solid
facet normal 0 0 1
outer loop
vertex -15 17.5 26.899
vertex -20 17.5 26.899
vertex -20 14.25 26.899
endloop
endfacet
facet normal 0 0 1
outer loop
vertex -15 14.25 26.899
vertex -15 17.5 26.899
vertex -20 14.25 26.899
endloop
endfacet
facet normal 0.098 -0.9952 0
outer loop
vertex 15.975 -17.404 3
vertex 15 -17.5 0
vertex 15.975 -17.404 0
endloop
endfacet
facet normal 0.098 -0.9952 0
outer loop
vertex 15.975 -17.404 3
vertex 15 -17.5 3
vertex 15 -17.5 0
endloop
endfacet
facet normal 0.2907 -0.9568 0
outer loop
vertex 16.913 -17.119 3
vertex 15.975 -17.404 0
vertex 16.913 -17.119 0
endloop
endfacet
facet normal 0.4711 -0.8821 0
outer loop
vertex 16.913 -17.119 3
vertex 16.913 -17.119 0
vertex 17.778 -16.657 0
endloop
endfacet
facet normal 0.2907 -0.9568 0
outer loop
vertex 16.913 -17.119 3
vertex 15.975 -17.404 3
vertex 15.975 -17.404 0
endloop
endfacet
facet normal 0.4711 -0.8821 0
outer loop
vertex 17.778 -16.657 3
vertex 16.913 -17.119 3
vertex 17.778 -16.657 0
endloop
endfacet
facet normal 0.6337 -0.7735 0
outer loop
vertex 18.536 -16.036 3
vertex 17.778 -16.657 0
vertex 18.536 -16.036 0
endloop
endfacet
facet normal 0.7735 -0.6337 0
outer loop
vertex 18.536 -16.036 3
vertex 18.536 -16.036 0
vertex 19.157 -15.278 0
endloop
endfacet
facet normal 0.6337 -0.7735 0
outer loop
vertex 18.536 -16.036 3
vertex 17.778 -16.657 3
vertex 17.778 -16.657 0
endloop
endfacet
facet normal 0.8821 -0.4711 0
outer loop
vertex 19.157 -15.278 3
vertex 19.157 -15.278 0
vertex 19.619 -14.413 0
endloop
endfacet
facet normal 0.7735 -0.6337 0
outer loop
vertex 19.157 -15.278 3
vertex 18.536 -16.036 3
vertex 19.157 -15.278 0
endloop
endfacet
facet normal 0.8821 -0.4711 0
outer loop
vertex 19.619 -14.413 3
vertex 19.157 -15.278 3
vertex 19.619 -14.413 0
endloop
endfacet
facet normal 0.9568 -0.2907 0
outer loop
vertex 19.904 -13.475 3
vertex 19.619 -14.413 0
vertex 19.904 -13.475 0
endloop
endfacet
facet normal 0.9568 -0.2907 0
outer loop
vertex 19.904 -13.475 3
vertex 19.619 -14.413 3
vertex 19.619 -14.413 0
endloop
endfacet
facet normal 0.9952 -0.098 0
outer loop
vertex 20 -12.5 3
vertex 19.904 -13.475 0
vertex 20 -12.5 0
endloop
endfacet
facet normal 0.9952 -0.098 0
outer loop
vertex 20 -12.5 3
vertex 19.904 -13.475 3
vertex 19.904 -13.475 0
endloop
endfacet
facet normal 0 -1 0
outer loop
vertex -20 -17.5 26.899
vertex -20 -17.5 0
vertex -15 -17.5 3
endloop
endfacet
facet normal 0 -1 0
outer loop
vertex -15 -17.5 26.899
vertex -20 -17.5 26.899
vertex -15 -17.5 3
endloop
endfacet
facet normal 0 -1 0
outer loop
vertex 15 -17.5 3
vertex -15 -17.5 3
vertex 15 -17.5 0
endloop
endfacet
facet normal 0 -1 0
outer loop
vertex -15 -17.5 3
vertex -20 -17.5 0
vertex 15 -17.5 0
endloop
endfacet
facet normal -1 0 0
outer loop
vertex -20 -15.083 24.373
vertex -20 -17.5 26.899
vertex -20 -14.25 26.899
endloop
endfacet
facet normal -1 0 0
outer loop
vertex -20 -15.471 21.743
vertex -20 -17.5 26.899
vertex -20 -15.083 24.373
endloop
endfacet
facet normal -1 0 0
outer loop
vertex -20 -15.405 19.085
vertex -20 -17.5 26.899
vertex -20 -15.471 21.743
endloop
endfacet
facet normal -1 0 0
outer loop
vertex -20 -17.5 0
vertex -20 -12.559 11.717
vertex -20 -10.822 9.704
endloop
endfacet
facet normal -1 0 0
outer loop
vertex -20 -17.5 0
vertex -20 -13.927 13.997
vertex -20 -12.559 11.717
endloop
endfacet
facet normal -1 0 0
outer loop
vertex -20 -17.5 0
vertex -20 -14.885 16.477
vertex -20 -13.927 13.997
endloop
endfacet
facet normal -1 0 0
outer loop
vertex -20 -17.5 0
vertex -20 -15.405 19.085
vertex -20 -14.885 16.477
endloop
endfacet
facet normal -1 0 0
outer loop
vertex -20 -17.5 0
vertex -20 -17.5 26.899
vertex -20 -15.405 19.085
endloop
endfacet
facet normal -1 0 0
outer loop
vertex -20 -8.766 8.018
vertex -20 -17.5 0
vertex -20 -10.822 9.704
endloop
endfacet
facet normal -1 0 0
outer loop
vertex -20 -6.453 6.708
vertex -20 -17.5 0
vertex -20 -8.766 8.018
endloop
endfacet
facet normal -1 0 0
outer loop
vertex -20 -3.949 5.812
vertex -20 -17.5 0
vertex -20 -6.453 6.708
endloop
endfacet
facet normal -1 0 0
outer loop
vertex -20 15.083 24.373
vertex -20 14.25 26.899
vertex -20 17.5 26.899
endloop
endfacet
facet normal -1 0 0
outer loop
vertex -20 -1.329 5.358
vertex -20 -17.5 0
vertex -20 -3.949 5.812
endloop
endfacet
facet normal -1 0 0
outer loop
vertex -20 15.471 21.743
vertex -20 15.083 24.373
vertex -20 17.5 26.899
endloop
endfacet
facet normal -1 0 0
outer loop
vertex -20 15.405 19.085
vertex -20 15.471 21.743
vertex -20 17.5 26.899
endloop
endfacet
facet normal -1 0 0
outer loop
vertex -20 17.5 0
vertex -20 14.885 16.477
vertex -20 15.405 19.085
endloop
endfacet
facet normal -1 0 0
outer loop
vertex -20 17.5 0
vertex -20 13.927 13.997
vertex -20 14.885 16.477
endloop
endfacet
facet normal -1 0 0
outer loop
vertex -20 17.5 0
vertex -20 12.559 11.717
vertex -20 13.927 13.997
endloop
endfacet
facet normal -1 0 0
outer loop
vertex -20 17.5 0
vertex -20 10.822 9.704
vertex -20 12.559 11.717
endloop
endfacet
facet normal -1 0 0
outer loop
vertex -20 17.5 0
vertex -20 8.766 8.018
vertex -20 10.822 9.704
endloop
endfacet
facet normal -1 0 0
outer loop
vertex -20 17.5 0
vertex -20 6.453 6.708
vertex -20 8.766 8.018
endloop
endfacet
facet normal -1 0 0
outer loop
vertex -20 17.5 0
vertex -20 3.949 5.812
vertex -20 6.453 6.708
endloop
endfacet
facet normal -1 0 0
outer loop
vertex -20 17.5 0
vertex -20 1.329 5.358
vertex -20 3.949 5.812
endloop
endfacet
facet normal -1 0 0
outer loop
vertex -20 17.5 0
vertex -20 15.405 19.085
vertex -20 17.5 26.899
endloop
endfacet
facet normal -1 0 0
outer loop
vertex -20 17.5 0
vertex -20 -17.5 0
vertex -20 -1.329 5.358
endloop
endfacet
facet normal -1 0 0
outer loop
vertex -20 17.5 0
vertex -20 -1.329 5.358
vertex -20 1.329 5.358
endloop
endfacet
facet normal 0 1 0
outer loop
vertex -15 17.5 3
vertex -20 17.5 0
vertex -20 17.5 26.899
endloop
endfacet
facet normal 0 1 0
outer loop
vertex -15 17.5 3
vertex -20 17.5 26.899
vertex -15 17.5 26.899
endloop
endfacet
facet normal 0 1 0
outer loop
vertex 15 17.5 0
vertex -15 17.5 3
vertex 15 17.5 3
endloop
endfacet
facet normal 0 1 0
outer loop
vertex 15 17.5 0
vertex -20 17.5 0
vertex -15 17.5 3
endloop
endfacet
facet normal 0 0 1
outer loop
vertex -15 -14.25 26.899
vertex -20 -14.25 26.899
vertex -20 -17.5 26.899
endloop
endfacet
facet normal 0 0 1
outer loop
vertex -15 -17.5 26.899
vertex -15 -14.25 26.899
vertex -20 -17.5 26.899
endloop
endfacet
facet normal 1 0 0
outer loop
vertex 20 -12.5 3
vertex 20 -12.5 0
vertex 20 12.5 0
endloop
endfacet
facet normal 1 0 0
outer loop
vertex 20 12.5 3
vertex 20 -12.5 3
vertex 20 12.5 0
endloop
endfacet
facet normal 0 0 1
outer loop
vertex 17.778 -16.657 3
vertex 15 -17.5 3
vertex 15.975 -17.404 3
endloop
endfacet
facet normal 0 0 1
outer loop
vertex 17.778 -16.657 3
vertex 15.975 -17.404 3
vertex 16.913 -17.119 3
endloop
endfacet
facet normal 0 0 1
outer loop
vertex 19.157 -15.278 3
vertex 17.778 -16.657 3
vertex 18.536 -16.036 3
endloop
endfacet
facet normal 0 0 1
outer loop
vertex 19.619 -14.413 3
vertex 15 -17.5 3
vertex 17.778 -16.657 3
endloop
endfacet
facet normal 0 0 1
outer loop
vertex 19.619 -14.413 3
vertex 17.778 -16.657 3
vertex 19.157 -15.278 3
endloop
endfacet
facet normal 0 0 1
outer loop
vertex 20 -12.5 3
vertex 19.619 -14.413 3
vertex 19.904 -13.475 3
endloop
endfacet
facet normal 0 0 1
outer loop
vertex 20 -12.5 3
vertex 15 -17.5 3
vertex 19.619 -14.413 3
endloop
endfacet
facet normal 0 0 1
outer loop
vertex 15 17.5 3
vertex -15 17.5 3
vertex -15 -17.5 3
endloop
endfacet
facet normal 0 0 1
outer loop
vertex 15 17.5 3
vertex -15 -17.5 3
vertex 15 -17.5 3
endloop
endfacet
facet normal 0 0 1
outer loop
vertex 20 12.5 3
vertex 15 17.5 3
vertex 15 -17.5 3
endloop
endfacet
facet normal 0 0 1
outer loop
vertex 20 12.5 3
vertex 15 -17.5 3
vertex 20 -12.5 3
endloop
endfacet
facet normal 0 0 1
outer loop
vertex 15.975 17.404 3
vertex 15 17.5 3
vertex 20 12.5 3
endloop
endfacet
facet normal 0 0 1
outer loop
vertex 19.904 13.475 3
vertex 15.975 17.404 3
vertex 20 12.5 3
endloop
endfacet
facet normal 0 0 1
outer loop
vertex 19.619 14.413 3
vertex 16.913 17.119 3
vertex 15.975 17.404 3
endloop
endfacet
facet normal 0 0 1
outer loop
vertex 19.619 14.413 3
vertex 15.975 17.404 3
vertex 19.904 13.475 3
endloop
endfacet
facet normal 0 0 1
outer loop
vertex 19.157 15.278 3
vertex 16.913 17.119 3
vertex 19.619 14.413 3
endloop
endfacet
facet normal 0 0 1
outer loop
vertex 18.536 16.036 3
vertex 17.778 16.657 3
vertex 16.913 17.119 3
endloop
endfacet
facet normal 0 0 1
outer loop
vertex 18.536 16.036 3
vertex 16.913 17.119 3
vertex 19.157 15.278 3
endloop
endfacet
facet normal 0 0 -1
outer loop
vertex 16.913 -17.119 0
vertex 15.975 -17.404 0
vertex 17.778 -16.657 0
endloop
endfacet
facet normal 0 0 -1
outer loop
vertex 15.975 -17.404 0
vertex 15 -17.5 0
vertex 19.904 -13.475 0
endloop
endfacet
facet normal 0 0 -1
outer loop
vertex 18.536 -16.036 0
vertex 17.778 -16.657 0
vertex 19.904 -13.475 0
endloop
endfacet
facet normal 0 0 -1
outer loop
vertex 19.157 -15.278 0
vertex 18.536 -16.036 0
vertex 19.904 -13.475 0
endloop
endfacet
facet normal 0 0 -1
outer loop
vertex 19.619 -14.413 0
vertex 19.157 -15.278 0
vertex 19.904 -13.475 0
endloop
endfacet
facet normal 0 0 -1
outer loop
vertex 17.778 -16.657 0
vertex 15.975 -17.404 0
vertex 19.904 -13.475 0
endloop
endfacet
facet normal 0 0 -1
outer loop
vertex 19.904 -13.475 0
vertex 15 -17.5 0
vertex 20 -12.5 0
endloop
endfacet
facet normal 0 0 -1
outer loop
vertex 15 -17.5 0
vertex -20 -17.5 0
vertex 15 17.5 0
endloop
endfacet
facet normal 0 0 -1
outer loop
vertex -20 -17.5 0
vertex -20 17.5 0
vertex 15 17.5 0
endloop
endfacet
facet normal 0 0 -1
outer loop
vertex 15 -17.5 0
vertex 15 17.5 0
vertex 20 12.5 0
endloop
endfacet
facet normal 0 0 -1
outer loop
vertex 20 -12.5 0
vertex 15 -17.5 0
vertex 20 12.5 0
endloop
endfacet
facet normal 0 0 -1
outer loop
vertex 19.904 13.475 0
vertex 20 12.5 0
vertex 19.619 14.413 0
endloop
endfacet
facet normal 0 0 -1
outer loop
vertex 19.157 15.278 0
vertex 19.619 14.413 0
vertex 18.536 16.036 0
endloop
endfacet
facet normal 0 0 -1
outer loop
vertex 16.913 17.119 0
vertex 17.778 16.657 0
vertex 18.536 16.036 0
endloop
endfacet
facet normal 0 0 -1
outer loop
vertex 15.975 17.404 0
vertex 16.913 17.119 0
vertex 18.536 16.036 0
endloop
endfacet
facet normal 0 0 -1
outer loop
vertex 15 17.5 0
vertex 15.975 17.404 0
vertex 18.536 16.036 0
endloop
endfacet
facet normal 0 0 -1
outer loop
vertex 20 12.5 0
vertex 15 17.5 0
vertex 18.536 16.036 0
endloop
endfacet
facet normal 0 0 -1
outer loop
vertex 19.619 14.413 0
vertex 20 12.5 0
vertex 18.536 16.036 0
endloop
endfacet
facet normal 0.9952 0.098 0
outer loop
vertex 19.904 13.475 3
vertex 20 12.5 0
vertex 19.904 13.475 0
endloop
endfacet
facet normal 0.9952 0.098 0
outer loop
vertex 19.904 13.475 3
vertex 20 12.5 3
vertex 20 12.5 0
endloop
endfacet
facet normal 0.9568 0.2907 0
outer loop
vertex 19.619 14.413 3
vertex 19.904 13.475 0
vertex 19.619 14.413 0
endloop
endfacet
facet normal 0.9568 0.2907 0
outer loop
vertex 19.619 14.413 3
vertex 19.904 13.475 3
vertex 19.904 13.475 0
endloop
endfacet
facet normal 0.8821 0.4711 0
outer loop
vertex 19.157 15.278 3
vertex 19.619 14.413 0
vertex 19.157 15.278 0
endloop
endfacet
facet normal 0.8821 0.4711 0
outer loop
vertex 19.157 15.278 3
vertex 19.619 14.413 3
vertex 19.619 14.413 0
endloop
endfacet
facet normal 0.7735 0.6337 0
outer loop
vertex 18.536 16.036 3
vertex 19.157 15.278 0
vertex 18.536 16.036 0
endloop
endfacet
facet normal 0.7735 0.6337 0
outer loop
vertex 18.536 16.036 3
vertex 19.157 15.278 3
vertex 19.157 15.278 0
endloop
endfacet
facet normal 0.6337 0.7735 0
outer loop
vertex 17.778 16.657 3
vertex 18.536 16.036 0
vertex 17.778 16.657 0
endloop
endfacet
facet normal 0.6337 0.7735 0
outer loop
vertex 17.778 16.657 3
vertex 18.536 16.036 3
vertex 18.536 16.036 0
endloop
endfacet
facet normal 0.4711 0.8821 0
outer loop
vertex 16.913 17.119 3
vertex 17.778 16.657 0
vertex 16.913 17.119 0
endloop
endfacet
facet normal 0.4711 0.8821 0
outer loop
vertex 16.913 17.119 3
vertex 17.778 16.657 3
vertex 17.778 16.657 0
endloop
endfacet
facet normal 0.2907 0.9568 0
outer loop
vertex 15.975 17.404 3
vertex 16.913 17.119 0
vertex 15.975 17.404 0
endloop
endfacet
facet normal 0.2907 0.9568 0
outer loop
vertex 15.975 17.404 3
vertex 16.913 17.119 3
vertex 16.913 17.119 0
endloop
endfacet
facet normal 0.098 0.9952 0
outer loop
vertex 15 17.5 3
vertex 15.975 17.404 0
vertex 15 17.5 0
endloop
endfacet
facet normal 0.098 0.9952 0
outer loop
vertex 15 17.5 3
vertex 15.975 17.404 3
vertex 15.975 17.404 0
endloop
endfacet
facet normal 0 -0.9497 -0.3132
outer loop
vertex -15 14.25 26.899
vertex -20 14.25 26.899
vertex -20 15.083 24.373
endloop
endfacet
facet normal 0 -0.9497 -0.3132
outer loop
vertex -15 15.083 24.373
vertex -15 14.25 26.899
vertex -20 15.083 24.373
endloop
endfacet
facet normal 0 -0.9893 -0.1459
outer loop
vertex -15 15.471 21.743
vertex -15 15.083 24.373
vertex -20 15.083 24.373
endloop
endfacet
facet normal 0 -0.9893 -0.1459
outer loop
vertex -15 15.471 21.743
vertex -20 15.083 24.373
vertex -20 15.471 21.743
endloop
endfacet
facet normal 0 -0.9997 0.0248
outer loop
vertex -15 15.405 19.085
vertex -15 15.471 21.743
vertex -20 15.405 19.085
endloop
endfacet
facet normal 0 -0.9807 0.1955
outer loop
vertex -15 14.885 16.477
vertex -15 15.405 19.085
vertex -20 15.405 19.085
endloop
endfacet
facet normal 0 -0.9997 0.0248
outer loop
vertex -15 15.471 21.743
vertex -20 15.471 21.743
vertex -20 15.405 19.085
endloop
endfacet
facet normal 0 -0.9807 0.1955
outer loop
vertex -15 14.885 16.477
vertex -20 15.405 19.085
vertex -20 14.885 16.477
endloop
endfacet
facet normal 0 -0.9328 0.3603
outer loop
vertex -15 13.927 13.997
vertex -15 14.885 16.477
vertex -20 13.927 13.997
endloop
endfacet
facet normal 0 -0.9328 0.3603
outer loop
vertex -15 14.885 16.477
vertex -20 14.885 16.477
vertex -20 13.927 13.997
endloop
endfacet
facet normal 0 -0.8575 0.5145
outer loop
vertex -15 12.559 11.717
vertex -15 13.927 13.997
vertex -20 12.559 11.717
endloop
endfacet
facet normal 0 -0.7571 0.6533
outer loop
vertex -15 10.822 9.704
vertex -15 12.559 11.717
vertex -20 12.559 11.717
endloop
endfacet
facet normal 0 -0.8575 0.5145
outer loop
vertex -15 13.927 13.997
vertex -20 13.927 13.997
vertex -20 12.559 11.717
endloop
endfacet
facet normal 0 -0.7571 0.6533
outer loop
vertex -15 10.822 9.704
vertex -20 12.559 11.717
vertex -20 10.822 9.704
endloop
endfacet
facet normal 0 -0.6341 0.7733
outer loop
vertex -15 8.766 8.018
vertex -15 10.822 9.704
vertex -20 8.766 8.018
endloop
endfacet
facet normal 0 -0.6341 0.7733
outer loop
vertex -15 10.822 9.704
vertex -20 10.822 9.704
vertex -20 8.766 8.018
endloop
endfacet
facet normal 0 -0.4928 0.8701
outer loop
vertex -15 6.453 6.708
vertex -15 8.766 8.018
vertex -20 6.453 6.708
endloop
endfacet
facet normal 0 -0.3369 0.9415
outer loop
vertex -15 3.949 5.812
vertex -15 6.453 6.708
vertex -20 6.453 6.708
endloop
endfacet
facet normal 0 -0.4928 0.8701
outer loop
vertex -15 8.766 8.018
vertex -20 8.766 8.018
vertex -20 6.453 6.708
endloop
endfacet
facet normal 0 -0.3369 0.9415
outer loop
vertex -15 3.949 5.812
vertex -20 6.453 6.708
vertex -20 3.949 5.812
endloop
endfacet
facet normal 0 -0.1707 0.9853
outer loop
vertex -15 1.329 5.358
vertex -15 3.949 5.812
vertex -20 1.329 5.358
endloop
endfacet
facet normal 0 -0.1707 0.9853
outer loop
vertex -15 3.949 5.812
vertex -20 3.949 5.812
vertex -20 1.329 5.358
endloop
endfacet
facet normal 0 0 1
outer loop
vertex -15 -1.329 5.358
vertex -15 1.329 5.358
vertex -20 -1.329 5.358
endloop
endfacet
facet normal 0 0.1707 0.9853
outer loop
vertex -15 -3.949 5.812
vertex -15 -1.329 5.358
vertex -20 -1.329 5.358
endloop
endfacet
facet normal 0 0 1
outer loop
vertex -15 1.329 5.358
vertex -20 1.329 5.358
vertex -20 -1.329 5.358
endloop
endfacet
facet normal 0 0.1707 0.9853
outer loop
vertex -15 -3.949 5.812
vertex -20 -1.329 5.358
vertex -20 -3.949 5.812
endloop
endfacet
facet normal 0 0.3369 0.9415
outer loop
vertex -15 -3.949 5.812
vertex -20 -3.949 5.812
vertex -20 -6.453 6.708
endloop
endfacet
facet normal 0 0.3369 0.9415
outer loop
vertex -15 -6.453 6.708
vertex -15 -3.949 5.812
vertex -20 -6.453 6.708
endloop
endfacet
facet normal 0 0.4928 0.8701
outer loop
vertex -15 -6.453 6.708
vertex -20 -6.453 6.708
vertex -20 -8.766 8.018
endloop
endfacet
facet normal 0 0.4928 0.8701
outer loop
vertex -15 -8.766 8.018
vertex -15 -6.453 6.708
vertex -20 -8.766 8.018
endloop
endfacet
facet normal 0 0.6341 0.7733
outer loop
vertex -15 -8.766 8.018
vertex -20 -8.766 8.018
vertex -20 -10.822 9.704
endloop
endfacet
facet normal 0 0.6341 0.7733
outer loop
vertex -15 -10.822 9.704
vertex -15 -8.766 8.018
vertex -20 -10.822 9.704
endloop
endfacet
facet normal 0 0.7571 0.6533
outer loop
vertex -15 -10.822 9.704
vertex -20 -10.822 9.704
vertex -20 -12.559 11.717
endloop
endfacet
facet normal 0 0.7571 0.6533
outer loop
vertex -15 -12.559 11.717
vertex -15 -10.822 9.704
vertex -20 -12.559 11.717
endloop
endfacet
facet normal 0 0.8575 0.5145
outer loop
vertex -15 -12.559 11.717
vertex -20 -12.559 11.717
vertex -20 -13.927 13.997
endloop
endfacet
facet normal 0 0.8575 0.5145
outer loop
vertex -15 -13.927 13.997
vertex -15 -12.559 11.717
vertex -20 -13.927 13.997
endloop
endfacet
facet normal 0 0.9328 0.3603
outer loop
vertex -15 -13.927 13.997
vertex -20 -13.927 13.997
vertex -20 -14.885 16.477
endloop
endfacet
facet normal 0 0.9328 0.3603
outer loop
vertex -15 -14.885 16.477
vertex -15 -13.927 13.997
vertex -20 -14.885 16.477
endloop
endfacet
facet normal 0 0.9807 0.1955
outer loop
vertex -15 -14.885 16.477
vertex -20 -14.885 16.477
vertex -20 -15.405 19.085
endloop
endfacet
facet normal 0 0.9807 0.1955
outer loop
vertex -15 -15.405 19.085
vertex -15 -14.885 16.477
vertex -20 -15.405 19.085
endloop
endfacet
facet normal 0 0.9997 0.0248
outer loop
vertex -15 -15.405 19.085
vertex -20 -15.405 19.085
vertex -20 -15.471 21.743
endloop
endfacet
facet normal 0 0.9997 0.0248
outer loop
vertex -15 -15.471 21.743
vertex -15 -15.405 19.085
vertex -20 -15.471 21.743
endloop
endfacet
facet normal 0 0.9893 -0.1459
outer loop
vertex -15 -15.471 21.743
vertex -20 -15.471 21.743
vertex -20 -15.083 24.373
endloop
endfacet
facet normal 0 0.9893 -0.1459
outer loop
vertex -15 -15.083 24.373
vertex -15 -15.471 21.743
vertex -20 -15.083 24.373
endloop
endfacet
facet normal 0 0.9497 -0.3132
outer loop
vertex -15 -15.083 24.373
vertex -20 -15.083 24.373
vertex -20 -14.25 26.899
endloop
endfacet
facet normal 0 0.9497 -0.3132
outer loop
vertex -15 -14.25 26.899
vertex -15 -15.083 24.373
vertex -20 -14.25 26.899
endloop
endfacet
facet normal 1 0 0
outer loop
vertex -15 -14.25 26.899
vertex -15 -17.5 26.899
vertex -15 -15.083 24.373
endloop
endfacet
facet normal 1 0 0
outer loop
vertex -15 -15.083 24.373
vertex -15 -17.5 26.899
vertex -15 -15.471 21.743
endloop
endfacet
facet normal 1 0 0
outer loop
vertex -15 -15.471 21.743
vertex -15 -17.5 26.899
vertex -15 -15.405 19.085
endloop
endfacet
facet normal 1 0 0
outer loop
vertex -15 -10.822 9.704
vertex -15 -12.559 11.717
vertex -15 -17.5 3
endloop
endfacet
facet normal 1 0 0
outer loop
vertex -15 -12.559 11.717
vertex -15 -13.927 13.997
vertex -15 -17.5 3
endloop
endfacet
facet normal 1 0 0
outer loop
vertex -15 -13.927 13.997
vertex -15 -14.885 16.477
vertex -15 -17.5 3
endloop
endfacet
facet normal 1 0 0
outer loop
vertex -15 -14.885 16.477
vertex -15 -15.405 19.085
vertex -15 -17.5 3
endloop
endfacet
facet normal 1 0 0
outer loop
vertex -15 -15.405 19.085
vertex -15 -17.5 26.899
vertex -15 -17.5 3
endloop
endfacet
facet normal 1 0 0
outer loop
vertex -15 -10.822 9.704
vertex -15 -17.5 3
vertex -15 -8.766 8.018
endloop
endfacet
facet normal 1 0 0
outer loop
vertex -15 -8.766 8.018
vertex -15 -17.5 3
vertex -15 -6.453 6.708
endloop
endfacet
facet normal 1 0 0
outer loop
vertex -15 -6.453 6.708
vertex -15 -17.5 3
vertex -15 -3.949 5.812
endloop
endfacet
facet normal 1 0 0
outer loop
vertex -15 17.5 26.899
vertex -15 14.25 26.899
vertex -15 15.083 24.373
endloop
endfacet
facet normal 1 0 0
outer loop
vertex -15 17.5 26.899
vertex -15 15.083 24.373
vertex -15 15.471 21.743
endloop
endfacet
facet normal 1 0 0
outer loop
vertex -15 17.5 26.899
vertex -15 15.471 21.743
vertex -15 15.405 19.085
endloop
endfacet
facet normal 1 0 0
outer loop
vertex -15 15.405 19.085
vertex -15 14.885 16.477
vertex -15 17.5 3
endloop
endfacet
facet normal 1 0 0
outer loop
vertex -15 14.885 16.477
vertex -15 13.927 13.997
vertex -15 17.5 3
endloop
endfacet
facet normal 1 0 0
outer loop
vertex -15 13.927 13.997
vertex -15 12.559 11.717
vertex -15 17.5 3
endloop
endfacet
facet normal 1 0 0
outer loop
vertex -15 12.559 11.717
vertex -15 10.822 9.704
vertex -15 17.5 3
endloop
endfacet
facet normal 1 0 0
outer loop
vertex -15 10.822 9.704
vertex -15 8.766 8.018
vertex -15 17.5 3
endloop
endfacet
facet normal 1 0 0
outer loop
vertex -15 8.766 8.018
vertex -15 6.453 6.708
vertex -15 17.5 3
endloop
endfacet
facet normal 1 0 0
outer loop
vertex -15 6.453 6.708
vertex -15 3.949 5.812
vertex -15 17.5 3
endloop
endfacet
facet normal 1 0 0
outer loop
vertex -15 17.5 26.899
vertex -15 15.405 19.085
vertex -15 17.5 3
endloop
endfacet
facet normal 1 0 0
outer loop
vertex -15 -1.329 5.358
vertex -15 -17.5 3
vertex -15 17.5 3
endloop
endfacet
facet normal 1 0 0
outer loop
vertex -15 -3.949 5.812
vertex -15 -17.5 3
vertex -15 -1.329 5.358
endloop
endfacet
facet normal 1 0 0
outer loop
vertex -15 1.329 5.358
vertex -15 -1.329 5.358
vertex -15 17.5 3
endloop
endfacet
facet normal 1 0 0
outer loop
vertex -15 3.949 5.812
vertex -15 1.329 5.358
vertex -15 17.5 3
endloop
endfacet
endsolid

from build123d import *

# Parameters (mm, degrees)
F0_W     = 40
F0_H     = 35
F1_DEPTH = 3
F2_R     = 5
F3_W     = 5
F3_H     = 35
F4_DEPTH = 40
F6_DEPTH = 40.001


with BuildPart() as f1:
    # F0 (on Top) → F1 (new body)
    with BuildSketch(Plane.XY):
        Rectangle(F0_W, F0_H)
    extrude(amount=F1_DEPTH)

    # F2
    f2_edges = [f1.edges().sort_by_distance(p)[0] for p in [
        (20, 17.5, 1.5),
        (20, -17.5, 1.5),
    ]]
    fillet(f2_edges, radius=F2_R)

    # F3 (on face) → F4 (join)
    with BuildSketch(Plane.XY.offset(3)):
        with Locations((-17.5, 0)):
            Rectangle(F3_W, F3_H)
    extrude(amount=F4_DEPTH)

    # F5 (on face) → F6 (cut, through all)
    with BuildSketch(Plane(origin=(-20, 0, 0), x_dir=(0, -1, 0), z_dir=(-1, 0, 0))):
        with BuildLine():
            Line((-17.5, 26.898632), (-14.25, 26.898632))
            ThreePointArc((-14.25, 26.898632), (0, 5.300476), (14.25, 26.898632))
            Line((14.25, 26.898632), (17.5, 26.898632))
            Line((17.5, 26.898632), (17.5, 43))
            Line((17.5, 43), (-17.5, 43))
            Line((-17.5, 43), (-17.5, 26.898632))
        make_face()
    extrude(amount=-F6_DEPTH, mode=Mode.SUBTRACT)


solid = f1.part
